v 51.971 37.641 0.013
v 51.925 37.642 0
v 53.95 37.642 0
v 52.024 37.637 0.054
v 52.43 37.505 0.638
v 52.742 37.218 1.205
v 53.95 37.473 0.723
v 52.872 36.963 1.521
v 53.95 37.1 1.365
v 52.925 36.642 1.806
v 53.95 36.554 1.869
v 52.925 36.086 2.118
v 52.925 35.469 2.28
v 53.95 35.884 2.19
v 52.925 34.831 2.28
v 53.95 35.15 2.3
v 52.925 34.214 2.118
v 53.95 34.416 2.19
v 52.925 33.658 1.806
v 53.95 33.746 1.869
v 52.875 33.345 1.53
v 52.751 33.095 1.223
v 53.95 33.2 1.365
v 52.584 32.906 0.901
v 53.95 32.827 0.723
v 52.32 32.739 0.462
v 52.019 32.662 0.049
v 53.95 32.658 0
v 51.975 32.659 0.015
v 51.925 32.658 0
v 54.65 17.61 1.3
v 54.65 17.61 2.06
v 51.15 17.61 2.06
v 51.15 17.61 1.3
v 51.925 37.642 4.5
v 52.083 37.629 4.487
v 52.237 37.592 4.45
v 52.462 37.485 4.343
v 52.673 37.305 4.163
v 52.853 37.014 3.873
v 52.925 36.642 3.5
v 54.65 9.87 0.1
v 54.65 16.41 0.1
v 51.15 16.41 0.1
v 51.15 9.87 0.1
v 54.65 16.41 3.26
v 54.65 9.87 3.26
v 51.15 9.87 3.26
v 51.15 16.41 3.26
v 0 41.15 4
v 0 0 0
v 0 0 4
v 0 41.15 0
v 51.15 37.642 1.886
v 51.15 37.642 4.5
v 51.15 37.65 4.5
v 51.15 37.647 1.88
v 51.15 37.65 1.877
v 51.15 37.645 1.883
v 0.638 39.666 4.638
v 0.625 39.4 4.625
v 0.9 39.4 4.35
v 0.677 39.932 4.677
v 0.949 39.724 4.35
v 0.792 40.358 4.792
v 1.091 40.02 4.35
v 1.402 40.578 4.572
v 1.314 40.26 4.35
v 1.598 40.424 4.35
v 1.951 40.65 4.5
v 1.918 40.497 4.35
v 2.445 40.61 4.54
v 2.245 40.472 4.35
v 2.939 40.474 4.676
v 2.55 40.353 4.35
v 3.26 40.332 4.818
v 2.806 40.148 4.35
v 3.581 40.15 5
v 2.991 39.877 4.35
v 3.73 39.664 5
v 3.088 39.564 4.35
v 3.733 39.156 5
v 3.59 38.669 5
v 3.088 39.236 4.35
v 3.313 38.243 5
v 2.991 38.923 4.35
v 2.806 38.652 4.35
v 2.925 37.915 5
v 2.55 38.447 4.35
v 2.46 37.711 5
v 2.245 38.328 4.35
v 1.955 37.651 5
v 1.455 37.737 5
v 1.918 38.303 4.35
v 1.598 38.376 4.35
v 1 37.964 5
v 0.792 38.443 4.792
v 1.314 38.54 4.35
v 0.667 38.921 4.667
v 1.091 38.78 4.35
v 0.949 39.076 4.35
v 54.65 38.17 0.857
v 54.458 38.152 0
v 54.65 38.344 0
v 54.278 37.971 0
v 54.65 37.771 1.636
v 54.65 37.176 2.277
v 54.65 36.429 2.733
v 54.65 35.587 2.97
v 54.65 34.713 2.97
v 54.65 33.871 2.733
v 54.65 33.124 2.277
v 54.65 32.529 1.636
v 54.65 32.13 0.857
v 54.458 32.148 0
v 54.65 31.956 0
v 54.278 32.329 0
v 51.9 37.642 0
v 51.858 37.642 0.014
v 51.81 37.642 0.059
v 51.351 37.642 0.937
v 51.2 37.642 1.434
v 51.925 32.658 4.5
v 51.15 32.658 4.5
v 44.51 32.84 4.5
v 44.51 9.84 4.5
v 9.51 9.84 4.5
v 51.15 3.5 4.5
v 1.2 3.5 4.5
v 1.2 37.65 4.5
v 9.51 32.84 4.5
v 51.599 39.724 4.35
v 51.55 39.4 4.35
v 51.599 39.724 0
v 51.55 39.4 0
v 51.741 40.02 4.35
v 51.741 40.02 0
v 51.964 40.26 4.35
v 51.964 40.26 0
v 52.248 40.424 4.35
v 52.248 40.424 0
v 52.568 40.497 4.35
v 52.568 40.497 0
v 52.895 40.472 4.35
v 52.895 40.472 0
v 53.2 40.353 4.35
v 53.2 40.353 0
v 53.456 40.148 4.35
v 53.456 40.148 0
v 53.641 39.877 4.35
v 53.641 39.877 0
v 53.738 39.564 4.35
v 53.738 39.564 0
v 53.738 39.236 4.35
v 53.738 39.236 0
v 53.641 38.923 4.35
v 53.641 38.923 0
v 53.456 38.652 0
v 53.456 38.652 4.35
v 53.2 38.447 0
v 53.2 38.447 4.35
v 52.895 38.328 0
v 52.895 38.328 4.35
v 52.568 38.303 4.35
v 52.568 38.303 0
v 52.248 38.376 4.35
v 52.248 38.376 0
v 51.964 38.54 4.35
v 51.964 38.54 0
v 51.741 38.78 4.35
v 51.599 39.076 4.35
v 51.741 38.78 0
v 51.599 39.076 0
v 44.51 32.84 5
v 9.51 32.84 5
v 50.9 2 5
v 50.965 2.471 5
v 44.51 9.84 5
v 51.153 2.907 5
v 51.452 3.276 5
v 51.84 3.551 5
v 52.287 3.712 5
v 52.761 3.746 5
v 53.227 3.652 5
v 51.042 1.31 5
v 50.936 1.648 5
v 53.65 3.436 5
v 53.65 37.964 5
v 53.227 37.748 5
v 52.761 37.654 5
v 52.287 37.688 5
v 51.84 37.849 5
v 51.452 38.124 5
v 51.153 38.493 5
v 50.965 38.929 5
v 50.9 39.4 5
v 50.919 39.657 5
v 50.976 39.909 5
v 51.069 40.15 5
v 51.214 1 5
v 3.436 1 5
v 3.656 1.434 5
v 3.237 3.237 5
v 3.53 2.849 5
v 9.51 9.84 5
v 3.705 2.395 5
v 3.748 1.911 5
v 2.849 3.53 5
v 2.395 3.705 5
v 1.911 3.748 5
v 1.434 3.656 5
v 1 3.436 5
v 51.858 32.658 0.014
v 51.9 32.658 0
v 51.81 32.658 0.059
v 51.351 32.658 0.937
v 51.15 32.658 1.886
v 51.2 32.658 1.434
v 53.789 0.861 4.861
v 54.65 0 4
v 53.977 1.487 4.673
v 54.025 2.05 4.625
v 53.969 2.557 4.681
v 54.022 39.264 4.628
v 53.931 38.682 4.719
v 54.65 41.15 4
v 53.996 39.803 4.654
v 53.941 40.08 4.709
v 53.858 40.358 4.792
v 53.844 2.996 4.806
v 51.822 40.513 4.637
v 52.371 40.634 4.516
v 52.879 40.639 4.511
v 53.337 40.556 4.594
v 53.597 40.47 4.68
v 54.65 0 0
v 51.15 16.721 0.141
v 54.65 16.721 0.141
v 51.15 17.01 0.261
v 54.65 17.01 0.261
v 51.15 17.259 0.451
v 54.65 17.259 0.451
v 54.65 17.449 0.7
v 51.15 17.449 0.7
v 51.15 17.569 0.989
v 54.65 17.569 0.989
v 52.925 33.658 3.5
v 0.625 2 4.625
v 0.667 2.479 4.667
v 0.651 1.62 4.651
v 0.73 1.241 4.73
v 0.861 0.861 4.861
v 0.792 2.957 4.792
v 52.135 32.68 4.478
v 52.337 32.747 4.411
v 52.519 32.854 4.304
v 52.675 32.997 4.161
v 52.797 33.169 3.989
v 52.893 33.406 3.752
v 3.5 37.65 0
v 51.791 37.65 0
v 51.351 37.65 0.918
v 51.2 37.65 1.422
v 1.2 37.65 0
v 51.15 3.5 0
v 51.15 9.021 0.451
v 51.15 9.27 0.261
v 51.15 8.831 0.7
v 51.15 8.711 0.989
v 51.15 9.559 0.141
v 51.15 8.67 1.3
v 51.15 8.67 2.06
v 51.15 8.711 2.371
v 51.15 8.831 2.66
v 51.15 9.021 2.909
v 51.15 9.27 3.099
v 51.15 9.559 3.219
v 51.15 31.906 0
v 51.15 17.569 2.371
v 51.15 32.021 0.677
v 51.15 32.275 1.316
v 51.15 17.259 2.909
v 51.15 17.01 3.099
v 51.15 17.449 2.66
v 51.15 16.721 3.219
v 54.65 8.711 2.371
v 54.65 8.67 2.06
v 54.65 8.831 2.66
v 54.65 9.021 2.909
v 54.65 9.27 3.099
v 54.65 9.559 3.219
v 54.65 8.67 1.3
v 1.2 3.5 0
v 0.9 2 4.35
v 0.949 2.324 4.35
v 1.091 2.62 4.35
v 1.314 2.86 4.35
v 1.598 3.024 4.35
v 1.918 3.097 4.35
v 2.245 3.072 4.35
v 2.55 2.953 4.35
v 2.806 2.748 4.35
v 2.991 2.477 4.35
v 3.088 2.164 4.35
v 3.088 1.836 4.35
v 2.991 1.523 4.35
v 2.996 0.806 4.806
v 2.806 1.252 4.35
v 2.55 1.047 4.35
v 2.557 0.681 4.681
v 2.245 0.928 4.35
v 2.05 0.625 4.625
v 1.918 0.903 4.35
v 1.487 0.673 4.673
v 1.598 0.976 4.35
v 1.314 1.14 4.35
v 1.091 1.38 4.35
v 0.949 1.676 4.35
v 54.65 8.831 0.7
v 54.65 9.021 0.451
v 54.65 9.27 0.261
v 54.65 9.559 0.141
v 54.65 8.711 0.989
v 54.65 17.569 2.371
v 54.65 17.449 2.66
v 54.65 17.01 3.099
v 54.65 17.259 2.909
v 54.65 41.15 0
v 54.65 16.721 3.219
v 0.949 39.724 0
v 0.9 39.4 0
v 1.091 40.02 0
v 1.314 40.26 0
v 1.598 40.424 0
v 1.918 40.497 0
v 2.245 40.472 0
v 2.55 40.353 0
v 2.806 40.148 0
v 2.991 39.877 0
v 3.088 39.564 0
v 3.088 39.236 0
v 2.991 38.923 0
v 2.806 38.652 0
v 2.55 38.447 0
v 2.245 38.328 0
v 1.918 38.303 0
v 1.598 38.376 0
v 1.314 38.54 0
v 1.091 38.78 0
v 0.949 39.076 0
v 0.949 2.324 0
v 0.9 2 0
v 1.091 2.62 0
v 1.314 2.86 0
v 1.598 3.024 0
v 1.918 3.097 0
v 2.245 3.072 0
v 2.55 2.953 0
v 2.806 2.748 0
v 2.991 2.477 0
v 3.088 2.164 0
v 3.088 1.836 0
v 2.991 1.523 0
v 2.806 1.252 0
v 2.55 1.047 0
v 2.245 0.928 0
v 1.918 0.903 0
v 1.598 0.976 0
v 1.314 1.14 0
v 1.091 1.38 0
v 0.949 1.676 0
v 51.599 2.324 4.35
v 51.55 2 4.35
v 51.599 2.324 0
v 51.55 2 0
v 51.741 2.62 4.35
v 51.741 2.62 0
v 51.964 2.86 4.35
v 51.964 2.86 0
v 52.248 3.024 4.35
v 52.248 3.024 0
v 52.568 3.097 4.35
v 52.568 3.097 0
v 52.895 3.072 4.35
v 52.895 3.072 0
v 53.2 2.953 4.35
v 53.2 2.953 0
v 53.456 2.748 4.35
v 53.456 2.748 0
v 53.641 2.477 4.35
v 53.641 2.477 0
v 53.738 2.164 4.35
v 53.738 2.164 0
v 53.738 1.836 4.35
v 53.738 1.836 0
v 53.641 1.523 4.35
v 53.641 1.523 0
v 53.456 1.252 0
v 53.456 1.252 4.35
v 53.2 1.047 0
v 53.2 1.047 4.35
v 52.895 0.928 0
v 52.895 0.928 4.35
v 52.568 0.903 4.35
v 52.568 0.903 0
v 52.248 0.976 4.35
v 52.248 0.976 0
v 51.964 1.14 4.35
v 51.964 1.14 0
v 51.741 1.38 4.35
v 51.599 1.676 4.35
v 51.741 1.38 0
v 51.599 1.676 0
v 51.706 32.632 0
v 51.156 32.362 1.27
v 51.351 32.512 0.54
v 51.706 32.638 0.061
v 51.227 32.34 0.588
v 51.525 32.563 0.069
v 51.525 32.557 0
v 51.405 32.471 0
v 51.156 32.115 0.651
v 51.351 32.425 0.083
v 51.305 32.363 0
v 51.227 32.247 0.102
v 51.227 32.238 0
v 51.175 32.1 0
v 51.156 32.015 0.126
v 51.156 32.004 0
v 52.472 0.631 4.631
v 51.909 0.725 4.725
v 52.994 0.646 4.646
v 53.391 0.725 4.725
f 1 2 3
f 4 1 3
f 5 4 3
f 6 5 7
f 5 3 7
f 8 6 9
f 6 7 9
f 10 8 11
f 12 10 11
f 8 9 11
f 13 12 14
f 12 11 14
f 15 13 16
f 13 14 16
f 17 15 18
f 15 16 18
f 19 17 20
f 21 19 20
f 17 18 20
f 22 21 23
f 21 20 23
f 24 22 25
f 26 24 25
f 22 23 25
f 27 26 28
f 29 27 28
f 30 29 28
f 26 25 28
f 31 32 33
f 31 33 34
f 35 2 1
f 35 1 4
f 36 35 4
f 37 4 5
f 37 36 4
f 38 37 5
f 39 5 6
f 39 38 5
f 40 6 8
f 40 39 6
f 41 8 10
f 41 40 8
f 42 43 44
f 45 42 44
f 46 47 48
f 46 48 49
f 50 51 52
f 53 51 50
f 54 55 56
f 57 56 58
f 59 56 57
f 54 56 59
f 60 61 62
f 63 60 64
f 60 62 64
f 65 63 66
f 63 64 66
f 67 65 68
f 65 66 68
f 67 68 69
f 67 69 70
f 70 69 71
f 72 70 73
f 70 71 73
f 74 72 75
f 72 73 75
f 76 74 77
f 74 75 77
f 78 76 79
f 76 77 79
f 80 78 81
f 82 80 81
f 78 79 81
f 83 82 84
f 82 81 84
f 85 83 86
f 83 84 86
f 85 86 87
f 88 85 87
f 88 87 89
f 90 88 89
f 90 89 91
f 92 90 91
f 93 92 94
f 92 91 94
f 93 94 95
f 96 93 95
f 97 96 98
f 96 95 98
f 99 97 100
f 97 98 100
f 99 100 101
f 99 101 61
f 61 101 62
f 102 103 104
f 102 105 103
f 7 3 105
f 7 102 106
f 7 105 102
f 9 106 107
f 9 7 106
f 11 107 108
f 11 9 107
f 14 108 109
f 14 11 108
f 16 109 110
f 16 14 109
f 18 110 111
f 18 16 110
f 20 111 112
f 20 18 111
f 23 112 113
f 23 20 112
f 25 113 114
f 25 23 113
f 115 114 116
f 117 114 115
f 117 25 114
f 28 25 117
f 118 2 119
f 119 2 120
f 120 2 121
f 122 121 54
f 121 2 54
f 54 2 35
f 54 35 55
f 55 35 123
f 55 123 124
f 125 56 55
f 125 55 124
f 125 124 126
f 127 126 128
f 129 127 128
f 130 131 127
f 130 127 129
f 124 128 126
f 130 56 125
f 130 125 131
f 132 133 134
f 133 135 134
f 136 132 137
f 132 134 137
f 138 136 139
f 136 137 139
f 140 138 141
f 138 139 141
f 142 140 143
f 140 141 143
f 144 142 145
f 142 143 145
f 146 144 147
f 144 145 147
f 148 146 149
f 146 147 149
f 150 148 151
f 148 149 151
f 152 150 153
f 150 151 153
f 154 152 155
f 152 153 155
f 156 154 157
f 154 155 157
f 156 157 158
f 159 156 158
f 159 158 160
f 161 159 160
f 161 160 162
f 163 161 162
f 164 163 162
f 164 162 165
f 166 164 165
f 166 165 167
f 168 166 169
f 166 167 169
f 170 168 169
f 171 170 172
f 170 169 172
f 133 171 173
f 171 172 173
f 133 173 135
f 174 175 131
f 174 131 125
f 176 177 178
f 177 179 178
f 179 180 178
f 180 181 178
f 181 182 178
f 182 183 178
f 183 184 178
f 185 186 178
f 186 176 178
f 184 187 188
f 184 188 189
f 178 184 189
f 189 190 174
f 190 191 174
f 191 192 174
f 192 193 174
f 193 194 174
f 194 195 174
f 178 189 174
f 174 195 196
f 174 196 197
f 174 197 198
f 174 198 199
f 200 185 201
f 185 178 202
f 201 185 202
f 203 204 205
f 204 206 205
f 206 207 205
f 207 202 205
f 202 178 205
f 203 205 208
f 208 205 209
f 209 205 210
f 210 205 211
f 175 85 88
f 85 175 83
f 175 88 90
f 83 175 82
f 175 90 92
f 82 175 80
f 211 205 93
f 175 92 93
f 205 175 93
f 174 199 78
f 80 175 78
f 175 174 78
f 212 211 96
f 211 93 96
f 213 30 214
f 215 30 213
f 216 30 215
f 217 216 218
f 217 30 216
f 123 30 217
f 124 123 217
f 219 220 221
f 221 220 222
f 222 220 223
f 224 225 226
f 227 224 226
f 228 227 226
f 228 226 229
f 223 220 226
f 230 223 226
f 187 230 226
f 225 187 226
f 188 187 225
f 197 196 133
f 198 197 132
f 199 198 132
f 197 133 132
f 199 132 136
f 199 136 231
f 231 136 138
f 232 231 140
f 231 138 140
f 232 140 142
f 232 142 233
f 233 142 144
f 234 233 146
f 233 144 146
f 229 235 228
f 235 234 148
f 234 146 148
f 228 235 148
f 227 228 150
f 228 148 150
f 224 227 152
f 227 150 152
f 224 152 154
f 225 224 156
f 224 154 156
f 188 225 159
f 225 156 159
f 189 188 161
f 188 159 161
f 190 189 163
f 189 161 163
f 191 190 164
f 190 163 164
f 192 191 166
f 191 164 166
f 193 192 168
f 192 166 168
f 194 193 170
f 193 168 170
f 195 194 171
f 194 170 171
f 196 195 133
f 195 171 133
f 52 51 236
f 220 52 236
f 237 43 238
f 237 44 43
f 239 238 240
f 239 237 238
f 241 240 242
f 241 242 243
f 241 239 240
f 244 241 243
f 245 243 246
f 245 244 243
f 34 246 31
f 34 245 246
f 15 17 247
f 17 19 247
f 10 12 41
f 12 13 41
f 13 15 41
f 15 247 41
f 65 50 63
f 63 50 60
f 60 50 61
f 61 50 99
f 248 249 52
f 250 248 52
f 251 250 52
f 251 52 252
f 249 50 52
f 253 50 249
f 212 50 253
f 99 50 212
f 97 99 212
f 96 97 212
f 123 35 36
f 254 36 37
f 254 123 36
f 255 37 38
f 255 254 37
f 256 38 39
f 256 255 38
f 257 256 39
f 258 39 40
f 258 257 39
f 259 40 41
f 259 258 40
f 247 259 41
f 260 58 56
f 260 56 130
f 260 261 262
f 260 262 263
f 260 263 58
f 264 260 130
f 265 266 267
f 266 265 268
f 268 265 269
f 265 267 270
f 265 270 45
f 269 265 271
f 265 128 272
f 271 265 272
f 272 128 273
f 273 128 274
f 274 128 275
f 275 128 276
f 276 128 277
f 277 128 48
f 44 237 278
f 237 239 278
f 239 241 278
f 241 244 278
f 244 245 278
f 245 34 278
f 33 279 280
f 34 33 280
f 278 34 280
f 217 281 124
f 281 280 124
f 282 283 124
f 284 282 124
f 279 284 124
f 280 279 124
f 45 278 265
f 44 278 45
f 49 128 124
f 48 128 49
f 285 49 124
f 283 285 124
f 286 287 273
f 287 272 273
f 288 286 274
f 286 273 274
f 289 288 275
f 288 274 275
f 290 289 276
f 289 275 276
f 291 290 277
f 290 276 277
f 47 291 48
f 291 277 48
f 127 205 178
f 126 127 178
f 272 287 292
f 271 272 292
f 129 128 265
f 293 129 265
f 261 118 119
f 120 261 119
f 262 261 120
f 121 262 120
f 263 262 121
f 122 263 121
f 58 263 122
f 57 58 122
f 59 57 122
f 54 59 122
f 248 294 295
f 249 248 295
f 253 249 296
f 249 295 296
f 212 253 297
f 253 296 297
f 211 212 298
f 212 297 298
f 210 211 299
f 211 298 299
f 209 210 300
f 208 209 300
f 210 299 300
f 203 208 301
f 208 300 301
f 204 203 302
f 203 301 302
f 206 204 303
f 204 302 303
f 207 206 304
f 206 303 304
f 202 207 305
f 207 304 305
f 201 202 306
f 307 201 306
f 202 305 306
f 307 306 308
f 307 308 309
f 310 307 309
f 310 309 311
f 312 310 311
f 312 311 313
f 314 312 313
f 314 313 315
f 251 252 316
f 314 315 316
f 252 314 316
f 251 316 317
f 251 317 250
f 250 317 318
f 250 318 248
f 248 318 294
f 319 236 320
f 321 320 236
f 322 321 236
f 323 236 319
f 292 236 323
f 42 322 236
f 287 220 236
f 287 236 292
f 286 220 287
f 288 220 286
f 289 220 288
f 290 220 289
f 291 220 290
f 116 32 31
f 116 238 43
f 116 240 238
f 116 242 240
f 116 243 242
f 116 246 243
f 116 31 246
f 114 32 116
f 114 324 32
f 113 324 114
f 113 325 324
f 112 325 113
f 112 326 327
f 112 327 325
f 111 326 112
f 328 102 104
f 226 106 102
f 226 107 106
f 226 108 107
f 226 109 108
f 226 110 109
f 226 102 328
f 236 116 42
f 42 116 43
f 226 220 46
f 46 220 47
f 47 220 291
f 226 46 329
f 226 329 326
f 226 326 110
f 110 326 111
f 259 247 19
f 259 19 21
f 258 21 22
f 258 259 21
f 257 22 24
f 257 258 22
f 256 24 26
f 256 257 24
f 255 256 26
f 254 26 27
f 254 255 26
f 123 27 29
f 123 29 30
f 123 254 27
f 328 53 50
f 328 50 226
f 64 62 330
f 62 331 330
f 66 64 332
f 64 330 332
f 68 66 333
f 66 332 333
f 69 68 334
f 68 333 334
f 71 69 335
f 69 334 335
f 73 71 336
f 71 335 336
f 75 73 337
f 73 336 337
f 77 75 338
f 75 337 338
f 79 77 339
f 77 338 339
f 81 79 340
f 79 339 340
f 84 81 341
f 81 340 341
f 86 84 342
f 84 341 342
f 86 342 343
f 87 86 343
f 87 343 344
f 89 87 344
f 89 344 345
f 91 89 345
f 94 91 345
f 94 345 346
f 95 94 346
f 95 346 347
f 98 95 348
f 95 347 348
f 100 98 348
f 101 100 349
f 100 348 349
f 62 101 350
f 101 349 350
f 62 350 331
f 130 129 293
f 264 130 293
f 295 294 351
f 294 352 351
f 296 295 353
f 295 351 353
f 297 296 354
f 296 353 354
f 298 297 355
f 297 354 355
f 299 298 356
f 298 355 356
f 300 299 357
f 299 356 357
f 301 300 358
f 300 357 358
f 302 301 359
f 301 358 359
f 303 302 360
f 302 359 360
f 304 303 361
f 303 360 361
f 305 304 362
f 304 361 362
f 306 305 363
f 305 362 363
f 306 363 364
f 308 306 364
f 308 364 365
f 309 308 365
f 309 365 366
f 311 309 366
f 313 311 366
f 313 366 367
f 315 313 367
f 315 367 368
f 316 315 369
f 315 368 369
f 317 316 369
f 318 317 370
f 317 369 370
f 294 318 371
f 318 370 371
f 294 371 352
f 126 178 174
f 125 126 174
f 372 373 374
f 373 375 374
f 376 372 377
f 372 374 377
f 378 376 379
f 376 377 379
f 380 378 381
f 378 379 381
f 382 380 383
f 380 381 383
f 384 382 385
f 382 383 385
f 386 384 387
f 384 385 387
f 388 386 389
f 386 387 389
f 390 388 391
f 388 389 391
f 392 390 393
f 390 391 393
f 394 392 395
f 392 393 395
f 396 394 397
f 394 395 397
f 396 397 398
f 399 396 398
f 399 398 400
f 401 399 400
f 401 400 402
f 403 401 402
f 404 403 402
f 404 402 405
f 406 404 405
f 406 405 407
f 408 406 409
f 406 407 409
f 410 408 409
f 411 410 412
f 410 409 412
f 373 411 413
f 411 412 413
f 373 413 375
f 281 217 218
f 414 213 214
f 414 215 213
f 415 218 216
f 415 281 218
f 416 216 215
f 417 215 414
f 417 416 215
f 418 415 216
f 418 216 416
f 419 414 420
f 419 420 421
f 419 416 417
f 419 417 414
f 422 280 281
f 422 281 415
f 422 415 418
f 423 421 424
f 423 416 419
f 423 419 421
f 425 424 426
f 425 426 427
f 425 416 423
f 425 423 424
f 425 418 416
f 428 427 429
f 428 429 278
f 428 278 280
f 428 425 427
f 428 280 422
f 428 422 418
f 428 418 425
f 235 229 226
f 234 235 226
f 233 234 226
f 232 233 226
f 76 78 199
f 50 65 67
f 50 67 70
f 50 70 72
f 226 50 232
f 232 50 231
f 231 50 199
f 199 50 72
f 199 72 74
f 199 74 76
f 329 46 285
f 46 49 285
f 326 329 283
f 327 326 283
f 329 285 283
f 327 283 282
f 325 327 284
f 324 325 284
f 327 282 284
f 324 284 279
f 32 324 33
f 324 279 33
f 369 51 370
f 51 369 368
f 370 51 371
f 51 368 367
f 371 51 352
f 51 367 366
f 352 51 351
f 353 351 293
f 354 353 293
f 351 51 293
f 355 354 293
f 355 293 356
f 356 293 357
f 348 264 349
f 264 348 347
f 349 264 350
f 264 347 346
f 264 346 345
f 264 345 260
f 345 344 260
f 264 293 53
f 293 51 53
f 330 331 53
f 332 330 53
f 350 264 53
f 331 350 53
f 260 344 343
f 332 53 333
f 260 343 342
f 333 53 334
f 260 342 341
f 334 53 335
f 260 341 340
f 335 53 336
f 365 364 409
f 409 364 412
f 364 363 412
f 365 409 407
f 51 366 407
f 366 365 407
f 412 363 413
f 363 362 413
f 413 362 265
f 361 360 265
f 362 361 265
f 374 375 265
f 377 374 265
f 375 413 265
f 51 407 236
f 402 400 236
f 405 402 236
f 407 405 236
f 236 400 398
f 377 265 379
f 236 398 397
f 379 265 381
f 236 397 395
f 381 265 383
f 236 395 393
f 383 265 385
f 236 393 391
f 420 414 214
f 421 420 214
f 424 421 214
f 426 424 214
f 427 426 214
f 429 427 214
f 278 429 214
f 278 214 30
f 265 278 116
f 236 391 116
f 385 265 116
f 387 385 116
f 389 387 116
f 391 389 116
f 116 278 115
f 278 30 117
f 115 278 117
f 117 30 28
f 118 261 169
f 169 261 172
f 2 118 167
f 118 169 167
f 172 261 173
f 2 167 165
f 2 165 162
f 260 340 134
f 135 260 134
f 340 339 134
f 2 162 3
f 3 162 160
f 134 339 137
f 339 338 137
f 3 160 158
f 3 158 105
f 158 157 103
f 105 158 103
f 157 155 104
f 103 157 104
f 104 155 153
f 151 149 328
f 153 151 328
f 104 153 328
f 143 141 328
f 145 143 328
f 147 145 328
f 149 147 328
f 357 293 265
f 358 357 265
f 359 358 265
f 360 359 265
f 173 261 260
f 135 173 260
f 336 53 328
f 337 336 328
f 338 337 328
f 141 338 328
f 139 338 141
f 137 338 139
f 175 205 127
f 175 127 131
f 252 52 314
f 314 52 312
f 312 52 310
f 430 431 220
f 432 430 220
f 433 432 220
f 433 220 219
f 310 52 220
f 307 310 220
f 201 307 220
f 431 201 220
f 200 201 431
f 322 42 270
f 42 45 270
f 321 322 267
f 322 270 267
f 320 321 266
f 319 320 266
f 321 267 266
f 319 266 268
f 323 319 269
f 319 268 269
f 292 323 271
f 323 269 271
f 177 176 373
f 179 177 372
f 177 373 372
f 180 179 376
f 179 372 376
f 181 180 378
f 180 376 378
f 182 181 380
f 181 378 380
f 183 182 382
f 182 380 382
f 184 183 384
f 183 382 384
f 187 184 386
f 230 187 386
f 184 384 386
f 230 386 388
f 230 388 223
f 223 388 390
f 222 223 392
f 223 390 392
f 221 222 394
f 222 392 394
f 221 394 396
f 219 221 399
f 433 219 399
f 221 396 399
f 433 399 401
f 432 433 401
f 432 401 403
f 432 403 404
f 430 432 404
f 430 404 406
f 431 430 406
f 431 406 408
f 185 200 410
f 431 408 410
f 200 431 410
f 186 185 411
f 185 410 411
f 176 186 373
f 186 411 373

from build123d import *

# Parameters (mm, degrees)
SKETCH1_W                                       = 54.65
SKETCH1_H                                       = 41.15
BOSS_EXTRUDE1_DEPTH                             = 5
SKETCH2_W                                       = 35
SKETCH2_H                                       = 23
CUT_EXTRUDE1_DEPTH                              = 1.5
SKETCH3_W                                       = 47.65
SKETCH3_H                                       = 34.15
CUT_EXTRUDE2_DEPTH                              = 4.5
SKETCH4_R                                       = 2.5
CUT_EXTRUDE3_DEPTH                              = 4
CHAMFER1_SIZE                                   = 0.7
CSK_FOR_M3_FLAT_HEAD_MACHINE_SCREW1_D           = 2.2
CSK_FOR_M3_FLAT_HEAD_MACHINE_SCREW1_DEPTH       = 6
CSK_FOR_M3_FLAT_HEAD_MACHINE_SCREW1_CSINK_D     = 3.5
CSK_FOR_M3_FLAT_HEAD_MACHINE_SCREW1_CSINK_ANGLE = 90
CSK_FOR_M3_FLAT_HEAD_MACHINE_SCREW1_TIP         = 0.660946681
CHAMFER2_SIZE                                   = 1
FILLET3_R                                       = 0.75
CUT_EXTRUDE4_REACH                              = 70.593
SKETCH7_W                                       = 3.26
SKETCH7_H                                       = 8.94
FILLET4_R                                       = 1.2
BOSS_EXTRUDE2_DEPTH                             = 10
BOSS_EXTRUDE2_DEPTH_BACK                        = 0.1
SKETCH8_W                                       = 3.5
SKETCH8_H                                       = 8.94
FILLET5_R                                       = 1.2
CUT_EXTRUDE5_DEPTH                              = 65.35505355
CUT_EXTRUDE5_DEPTH_BACK                         = 65.35505355
SKETCH9_W                                       = 3.5
SKETCH9_H                                       = 10
SKETCH10_W                                      = 4.5
SKETCH10_H                                      = 34.15
CUT_EXTRUDE6_DEPTH                              = 2.3
CUT_EXTRUDE7_START                              = -4.5
SKETCH11_W                                      = 3.064355189
SKETCH11_H                                      = 4.983974318
CUT_EXTRUDE7_DEPTH                              = 4.5
FILLET6_R                                       = 1


with BuildPart() as part:
    # Sketch1 → Boss-Extrude1 (new body)
    with BuildSketch(Plane.XY):
        with Locations((27.325, 20.575)):
            Rectangle(SKETCH1_W, SKETCH1_H)
    extrude(amount=BOSS_EXTRUDE1_DEPTH)

    # Sketch2 → Cut-Extrude1 (cut)
    with BuildSketch(Plane.XY.offset(5)):
        with Locations((27.01, 21.34)):
            Rectangle(SKETCH2_W, SKETCH2_H)
    extrude(amount=-CUT_EXTRUDE1_DEPTH, mode=Mode.SUBTRACT)

    # Sketch3 → Cut-Extrude2 (cut)
    with BuildSketch(Plane(origin=(0, 0, 0), x_dir=(-1, 0, 0), z_dir=(0, 0, -1))):
        with Locations((-27.325, 20.575)):
            Rectangle(SKETCH3_W, SKETCH3_H)
    extrude(amount=-CUT_EXTRUDE2_DEPTH, mode=Mode.SUBTRACT)

    # Sketch4 → Cut-Extrude3 (cut)
    with BuildSketch(Plane(origin=(54.65, 0, 0), x_dir=(0, 0, -1), z_dir=(1, 0, 0))):
        with Locations((0.2, 35.15)):
            Circle(SKETCH4_R)
    extrude(amount=-CUT_EXTRUDE3_DEPTH, mode=Mode.SUBTRACT)

    # Chamfer1
    chamfer1_edges = [part.edges().sort_by_distance(p)[0] for p in [
        (54.65, 35.15, 2.3),
    ]]
    chamfer(chamfer1_edges, length=CHAMFER1_SIZE)

    # CSK for M3 Flat Head Machine Screw1
    with Locations(Plane.XY.offset(5)):
        with Locations((52.65, 2), (2, 39.4), (52.65, 39.4), (2, 2)):
            CounterSinkHole(CSK_FOR_M3_FLAT_HEAD_MACHINE_SCREW1_D / 2, CSK_FOR_M3_FLAT_HEAD_MACHINE_SCREW1_CSINK_D / 2, depth=CSK_FOR_M3_FLAT_HEAD_MACHINE_SCREW1_DEPTH, counter_sink_angle=CSK_FOR_M3_FLAT_HEAD_MACHINE_SCREW1_CSINK_ANGLE)
            with Locations((0, 0, -(CSK_FOR_M3_FLAT_HEAD_MACHINE_SCREW1_DEPTH + CSK_FOR_M3_FLAT_HEAD_MACHINE_SCREW1_TIP / 2))):  # 118° drill point
                Cone(0, CSK_FOR_M3_FLAT_HEAD_MACHINE_SCREW1_D / 2, CSK_FOR_M3_FLAT_HEAD_MACHINE_SCREW1_TIP, mode=Mode.SUBTRACT)

    # Chamfer2
    # the kernel refuses this chamfer: 1 mm, written as the material it takes off along each edge
    with BuildSketch(Plane(origin=(-0.571682988, 41.15, 5), x_dir=(0, -0.9996219169112968, 0.027495876610586414), z_dir=(1, 0, 0))) as chamfer2_piece_1:
        Polygon((CHAMFER2_SIZE * 0.999621916911, CHAMFER2_SIZE * 0.0274958766106), (-CHAMFER2_SIZE * 0.0274958766106, CHAMFER2_SIZE * 0.999621916911), (0, 0), align=None)
    extrude(amount=55.793365976, mode=Mode.SUBTRACT)
    with BuildSketch(Plane(origin=(54.65, 43.721682988, 5), x_dir=(0.02749587661058907, 0, -0.9996219169112965), z_dir=(0, -1, 0)), Plane(origin=(0, -2.571682988, 5), x_dir=(-0.027495876610586365, 0, -0.9996219169112968), z_dir=(0, 1, 0))) as chamfer2_piece_2:
        Polygon((CHAMFER2_SIZE * 0.999621916911, -CHAMFER2_SIZE * 0.0274958766106), (-CHAMFER2_SIZE * 0.0274958766106, -CHAMFER2_SIZE * 0.999621916911), (0, 0), align=None)
    extrude(amount=46.293365976, mode=Mode.SUBTRACT)
    with BuildSketch(Plane(origin=(57.221682988, 0, 5), x_dir=(0, -0.027495876610586365, -0.9996219169112968), z_dir=(-1, 0, 0))) as chamfer2_piece_3:
        Polygon((CHAMFER2_SIZE * 0.999621916911, -CHAMFER2_SIZE * 0.0274958766106), (-CHAMFER2_SIZE * 0.0274958766106, -CHAMFER2_SIZE * 0.999621916911), (0, 0), align=None)
    extrude(amount=59.793365976, mode=Mode.SUBTRACT)

    # Fillet3
    fillet3_edges = [part.edges().sort_by_distance(p)[0] for p in [
        (51.15, 35.15, 2.3),
    ]]
    fillet(fillet3_edges, radius=FILLET3_R)

    # Sketch7 → Cut-Extrude4 (cut, up to next)
    with BuildSketch(Plane(origin=(54.65, 0, 0), x_dir=(0, 0, -1), z_dir=(1, 0, 0)), mode=Mode.PRIVATE) as cut_extrude4_sk1:
        with Locations((-1.63, 13.14)):
            Rectangle(SKETCH7_W, SKETCH7_H)
    cut_extrude4_tool1 = extrude(cut_extrude4_sk1.sketch, amount=-CUT_EXTRUDE4_REACH, mode=Mode.PRIVATE) & part.part
    add(cut_extrude4_tool1.solids().sort_by_distance((54.65, 13.14, 1.63))[0], mode=Mode.SUBTRACT)

    # Fillet4
    fillet4_edges = [part.edges().sort_by_distance(p)[0] for p in [
        (52.9, 8.67, 3.26),
        (52.9, 17.61, 3.26),
    ]]
    fillet(fillet4_edges, radius=FILLET4_R)

    # Sketch8 → Boss-Extrude2 (add, two sides: drawn at the far end of the back side and taken through both)
    with BuildSketch(Plane(origin=(0, 0, 0), x_dir=(-1, 0, 0), z_dir=(0, 0, -1)).offset(-BOSS_EXTRUDE2_DEPTH_BACK)):
        with Locations((-52.9, 13.14)):
            Rectangle(SKETCH8_W, SKETCH8_H)
    extrude(amount=BOSS_EXTRUDE2_DEPTH + BOSS_EXTRUDE2_DEPTH_BACK)

    # Fillet5
    fillet5_edges = [part.edges().sort_by_distance(p)[0] for p in [
        (52.9, 17.61, 0.1),
        (52.9, 8.67, 0.1),
    ]]
    fillet(fillet5_edges, radius=FILLET5_R)

    # Sketch9 → Cut-Extrude5 (cut, two sides: drawn at the far end of the back side and taken through both)
    with BuildSketch(Plane.XZ.offset(-8.67).offset(-CUT_EXTRUDE5_DEPTH_BACK)):
        with Locations((52.9, -5)):
            Rectangle(SKETCH9_W, SKETCH9_H)
    extrude(amount=CUT_EXTRUDE5_DEPTH + CUT_EXTRUDE5_DEPTH_BACK, mode=Mode.SUBTRACT)

    # Sketch10 → Cut-Extrude6 (cut)
    with BuildSketch(Plane(origin=(3.5, 0, 0), x_dir=(0, 0, -1), z_dir=(1, 0, 0))):
        with Locations((-2.25, 20.575)):
            Rectangle(SKETCH10_W, SKETCH10_H)
    extrude(amount=-CUT_EXTRUDE6_DEPTH, mode=Mode.SUBTRACT)

    # Sketch11 → Cut-Extrude7 (cut)
    with BuildSketch(Plane(origin=(0, 0, 0), x_dir=(-1, 0, 0), z_dir=(0, 0, -1)).offset(CUT_EXTRUDE7_START)):
        with Locations((-51.392822405, 35.15)):
            Rectangle(SKETCH11_W, SKETCH11_H)
    extrude(amount=CUT_EXTRUDE7_DEPTH, mode=Mode.SUBTRACT)

    # Fillet6
    # the kernel refuses this fillet: 1 mm, written as the material it adds along each edge
    with BuildSketch(Plane(origin=(52.925, 32.658012841, 7), x_dir=(-1, 0, 0), z_dir=(0, 0, -1))) as fillet6_piece_1_section:
        with BuildLine():
            CenterArc((FILLET6_R, FILLET6_R), FILLET6_R, 180, 90)
            Line((0, FILLET6_R), (0, 0))
            Line((0, 0), (FILLET6_R, 0))
        make_face()
    fillet6_piece_1 = extrude(amount=7, mode=Mode.PRIVATE)
    fillet6_piece_1 = fillet6_piece_1 - Plane(origin=(52.688942882, 35.15, -0.2), x_dir=(0, 0, -1), z_dir=(1, 0, 0)) * Cylinder(2.5, 18, mode=Mode.PRIVATE)
    fillet6_piece_1 = split(fillet6_piece_1, bisect_by=Plane(origin=(52.688942882, 32.861757349, 5), z_dir=(0, 0, -1)), keep=Keep.TOP, mode=Mode.PRIVATE)
    add(fillet6_piece_1)
    with BuildSketch(Plane(origin=(52.925, 30.158012841, 4.5), x_dir=(-1, 0, 0), z_dir=(0, 1, 0))) as fillet6_piece_2:
        with BuildLine():
            CenterArc((FILLET6_R, -FILLET6_R), FILLET6_R, 90, 90)
            Line((0, -FILLET6_R), (0, 0))
            Line((0, 0), (FILLET6_R, 0))
        make_face()
    extrude(amount=7.483974318)
    with BuildSketch(Plane(origin=(52.925, 37.641987159, 7), x_dir=(0, -1, 0), z_dir=(0, 0, -1))) as fillet6_piece_3_section:
        with BuildLine():
            CenterArc((FILLET6_R, FILLET6_R), FILLET6_R, 180, 90)
            Line((0, FILLET6_R), (0, 0))
            Line((0, 0), (FILLET6_R, 0))
        make_face()
    fillet6_piece_3 = extrude(amount=7, mode=Mode.PRIVATE)
    fillet6_piece_3 = fillet6_piece_3 - Plane(origin=(52.688929228, 35.15, -0.2), x_dir=(0, 0, -1), z_dir=(1, 0, 0)) * Cylinder(2.5, 18, mode=Mode.PRIVATE)
    fillet6_piece_3 = split(fillet6_piece_3, bisect_by=Plane(origin=(52.688929228, 37.438232823, 5), z_dir=(0, 0, -1)), keep=Keep.TOP, mode=Mode.PRIVATE)
    add(fillet6_piece_3)


solid = part.part
